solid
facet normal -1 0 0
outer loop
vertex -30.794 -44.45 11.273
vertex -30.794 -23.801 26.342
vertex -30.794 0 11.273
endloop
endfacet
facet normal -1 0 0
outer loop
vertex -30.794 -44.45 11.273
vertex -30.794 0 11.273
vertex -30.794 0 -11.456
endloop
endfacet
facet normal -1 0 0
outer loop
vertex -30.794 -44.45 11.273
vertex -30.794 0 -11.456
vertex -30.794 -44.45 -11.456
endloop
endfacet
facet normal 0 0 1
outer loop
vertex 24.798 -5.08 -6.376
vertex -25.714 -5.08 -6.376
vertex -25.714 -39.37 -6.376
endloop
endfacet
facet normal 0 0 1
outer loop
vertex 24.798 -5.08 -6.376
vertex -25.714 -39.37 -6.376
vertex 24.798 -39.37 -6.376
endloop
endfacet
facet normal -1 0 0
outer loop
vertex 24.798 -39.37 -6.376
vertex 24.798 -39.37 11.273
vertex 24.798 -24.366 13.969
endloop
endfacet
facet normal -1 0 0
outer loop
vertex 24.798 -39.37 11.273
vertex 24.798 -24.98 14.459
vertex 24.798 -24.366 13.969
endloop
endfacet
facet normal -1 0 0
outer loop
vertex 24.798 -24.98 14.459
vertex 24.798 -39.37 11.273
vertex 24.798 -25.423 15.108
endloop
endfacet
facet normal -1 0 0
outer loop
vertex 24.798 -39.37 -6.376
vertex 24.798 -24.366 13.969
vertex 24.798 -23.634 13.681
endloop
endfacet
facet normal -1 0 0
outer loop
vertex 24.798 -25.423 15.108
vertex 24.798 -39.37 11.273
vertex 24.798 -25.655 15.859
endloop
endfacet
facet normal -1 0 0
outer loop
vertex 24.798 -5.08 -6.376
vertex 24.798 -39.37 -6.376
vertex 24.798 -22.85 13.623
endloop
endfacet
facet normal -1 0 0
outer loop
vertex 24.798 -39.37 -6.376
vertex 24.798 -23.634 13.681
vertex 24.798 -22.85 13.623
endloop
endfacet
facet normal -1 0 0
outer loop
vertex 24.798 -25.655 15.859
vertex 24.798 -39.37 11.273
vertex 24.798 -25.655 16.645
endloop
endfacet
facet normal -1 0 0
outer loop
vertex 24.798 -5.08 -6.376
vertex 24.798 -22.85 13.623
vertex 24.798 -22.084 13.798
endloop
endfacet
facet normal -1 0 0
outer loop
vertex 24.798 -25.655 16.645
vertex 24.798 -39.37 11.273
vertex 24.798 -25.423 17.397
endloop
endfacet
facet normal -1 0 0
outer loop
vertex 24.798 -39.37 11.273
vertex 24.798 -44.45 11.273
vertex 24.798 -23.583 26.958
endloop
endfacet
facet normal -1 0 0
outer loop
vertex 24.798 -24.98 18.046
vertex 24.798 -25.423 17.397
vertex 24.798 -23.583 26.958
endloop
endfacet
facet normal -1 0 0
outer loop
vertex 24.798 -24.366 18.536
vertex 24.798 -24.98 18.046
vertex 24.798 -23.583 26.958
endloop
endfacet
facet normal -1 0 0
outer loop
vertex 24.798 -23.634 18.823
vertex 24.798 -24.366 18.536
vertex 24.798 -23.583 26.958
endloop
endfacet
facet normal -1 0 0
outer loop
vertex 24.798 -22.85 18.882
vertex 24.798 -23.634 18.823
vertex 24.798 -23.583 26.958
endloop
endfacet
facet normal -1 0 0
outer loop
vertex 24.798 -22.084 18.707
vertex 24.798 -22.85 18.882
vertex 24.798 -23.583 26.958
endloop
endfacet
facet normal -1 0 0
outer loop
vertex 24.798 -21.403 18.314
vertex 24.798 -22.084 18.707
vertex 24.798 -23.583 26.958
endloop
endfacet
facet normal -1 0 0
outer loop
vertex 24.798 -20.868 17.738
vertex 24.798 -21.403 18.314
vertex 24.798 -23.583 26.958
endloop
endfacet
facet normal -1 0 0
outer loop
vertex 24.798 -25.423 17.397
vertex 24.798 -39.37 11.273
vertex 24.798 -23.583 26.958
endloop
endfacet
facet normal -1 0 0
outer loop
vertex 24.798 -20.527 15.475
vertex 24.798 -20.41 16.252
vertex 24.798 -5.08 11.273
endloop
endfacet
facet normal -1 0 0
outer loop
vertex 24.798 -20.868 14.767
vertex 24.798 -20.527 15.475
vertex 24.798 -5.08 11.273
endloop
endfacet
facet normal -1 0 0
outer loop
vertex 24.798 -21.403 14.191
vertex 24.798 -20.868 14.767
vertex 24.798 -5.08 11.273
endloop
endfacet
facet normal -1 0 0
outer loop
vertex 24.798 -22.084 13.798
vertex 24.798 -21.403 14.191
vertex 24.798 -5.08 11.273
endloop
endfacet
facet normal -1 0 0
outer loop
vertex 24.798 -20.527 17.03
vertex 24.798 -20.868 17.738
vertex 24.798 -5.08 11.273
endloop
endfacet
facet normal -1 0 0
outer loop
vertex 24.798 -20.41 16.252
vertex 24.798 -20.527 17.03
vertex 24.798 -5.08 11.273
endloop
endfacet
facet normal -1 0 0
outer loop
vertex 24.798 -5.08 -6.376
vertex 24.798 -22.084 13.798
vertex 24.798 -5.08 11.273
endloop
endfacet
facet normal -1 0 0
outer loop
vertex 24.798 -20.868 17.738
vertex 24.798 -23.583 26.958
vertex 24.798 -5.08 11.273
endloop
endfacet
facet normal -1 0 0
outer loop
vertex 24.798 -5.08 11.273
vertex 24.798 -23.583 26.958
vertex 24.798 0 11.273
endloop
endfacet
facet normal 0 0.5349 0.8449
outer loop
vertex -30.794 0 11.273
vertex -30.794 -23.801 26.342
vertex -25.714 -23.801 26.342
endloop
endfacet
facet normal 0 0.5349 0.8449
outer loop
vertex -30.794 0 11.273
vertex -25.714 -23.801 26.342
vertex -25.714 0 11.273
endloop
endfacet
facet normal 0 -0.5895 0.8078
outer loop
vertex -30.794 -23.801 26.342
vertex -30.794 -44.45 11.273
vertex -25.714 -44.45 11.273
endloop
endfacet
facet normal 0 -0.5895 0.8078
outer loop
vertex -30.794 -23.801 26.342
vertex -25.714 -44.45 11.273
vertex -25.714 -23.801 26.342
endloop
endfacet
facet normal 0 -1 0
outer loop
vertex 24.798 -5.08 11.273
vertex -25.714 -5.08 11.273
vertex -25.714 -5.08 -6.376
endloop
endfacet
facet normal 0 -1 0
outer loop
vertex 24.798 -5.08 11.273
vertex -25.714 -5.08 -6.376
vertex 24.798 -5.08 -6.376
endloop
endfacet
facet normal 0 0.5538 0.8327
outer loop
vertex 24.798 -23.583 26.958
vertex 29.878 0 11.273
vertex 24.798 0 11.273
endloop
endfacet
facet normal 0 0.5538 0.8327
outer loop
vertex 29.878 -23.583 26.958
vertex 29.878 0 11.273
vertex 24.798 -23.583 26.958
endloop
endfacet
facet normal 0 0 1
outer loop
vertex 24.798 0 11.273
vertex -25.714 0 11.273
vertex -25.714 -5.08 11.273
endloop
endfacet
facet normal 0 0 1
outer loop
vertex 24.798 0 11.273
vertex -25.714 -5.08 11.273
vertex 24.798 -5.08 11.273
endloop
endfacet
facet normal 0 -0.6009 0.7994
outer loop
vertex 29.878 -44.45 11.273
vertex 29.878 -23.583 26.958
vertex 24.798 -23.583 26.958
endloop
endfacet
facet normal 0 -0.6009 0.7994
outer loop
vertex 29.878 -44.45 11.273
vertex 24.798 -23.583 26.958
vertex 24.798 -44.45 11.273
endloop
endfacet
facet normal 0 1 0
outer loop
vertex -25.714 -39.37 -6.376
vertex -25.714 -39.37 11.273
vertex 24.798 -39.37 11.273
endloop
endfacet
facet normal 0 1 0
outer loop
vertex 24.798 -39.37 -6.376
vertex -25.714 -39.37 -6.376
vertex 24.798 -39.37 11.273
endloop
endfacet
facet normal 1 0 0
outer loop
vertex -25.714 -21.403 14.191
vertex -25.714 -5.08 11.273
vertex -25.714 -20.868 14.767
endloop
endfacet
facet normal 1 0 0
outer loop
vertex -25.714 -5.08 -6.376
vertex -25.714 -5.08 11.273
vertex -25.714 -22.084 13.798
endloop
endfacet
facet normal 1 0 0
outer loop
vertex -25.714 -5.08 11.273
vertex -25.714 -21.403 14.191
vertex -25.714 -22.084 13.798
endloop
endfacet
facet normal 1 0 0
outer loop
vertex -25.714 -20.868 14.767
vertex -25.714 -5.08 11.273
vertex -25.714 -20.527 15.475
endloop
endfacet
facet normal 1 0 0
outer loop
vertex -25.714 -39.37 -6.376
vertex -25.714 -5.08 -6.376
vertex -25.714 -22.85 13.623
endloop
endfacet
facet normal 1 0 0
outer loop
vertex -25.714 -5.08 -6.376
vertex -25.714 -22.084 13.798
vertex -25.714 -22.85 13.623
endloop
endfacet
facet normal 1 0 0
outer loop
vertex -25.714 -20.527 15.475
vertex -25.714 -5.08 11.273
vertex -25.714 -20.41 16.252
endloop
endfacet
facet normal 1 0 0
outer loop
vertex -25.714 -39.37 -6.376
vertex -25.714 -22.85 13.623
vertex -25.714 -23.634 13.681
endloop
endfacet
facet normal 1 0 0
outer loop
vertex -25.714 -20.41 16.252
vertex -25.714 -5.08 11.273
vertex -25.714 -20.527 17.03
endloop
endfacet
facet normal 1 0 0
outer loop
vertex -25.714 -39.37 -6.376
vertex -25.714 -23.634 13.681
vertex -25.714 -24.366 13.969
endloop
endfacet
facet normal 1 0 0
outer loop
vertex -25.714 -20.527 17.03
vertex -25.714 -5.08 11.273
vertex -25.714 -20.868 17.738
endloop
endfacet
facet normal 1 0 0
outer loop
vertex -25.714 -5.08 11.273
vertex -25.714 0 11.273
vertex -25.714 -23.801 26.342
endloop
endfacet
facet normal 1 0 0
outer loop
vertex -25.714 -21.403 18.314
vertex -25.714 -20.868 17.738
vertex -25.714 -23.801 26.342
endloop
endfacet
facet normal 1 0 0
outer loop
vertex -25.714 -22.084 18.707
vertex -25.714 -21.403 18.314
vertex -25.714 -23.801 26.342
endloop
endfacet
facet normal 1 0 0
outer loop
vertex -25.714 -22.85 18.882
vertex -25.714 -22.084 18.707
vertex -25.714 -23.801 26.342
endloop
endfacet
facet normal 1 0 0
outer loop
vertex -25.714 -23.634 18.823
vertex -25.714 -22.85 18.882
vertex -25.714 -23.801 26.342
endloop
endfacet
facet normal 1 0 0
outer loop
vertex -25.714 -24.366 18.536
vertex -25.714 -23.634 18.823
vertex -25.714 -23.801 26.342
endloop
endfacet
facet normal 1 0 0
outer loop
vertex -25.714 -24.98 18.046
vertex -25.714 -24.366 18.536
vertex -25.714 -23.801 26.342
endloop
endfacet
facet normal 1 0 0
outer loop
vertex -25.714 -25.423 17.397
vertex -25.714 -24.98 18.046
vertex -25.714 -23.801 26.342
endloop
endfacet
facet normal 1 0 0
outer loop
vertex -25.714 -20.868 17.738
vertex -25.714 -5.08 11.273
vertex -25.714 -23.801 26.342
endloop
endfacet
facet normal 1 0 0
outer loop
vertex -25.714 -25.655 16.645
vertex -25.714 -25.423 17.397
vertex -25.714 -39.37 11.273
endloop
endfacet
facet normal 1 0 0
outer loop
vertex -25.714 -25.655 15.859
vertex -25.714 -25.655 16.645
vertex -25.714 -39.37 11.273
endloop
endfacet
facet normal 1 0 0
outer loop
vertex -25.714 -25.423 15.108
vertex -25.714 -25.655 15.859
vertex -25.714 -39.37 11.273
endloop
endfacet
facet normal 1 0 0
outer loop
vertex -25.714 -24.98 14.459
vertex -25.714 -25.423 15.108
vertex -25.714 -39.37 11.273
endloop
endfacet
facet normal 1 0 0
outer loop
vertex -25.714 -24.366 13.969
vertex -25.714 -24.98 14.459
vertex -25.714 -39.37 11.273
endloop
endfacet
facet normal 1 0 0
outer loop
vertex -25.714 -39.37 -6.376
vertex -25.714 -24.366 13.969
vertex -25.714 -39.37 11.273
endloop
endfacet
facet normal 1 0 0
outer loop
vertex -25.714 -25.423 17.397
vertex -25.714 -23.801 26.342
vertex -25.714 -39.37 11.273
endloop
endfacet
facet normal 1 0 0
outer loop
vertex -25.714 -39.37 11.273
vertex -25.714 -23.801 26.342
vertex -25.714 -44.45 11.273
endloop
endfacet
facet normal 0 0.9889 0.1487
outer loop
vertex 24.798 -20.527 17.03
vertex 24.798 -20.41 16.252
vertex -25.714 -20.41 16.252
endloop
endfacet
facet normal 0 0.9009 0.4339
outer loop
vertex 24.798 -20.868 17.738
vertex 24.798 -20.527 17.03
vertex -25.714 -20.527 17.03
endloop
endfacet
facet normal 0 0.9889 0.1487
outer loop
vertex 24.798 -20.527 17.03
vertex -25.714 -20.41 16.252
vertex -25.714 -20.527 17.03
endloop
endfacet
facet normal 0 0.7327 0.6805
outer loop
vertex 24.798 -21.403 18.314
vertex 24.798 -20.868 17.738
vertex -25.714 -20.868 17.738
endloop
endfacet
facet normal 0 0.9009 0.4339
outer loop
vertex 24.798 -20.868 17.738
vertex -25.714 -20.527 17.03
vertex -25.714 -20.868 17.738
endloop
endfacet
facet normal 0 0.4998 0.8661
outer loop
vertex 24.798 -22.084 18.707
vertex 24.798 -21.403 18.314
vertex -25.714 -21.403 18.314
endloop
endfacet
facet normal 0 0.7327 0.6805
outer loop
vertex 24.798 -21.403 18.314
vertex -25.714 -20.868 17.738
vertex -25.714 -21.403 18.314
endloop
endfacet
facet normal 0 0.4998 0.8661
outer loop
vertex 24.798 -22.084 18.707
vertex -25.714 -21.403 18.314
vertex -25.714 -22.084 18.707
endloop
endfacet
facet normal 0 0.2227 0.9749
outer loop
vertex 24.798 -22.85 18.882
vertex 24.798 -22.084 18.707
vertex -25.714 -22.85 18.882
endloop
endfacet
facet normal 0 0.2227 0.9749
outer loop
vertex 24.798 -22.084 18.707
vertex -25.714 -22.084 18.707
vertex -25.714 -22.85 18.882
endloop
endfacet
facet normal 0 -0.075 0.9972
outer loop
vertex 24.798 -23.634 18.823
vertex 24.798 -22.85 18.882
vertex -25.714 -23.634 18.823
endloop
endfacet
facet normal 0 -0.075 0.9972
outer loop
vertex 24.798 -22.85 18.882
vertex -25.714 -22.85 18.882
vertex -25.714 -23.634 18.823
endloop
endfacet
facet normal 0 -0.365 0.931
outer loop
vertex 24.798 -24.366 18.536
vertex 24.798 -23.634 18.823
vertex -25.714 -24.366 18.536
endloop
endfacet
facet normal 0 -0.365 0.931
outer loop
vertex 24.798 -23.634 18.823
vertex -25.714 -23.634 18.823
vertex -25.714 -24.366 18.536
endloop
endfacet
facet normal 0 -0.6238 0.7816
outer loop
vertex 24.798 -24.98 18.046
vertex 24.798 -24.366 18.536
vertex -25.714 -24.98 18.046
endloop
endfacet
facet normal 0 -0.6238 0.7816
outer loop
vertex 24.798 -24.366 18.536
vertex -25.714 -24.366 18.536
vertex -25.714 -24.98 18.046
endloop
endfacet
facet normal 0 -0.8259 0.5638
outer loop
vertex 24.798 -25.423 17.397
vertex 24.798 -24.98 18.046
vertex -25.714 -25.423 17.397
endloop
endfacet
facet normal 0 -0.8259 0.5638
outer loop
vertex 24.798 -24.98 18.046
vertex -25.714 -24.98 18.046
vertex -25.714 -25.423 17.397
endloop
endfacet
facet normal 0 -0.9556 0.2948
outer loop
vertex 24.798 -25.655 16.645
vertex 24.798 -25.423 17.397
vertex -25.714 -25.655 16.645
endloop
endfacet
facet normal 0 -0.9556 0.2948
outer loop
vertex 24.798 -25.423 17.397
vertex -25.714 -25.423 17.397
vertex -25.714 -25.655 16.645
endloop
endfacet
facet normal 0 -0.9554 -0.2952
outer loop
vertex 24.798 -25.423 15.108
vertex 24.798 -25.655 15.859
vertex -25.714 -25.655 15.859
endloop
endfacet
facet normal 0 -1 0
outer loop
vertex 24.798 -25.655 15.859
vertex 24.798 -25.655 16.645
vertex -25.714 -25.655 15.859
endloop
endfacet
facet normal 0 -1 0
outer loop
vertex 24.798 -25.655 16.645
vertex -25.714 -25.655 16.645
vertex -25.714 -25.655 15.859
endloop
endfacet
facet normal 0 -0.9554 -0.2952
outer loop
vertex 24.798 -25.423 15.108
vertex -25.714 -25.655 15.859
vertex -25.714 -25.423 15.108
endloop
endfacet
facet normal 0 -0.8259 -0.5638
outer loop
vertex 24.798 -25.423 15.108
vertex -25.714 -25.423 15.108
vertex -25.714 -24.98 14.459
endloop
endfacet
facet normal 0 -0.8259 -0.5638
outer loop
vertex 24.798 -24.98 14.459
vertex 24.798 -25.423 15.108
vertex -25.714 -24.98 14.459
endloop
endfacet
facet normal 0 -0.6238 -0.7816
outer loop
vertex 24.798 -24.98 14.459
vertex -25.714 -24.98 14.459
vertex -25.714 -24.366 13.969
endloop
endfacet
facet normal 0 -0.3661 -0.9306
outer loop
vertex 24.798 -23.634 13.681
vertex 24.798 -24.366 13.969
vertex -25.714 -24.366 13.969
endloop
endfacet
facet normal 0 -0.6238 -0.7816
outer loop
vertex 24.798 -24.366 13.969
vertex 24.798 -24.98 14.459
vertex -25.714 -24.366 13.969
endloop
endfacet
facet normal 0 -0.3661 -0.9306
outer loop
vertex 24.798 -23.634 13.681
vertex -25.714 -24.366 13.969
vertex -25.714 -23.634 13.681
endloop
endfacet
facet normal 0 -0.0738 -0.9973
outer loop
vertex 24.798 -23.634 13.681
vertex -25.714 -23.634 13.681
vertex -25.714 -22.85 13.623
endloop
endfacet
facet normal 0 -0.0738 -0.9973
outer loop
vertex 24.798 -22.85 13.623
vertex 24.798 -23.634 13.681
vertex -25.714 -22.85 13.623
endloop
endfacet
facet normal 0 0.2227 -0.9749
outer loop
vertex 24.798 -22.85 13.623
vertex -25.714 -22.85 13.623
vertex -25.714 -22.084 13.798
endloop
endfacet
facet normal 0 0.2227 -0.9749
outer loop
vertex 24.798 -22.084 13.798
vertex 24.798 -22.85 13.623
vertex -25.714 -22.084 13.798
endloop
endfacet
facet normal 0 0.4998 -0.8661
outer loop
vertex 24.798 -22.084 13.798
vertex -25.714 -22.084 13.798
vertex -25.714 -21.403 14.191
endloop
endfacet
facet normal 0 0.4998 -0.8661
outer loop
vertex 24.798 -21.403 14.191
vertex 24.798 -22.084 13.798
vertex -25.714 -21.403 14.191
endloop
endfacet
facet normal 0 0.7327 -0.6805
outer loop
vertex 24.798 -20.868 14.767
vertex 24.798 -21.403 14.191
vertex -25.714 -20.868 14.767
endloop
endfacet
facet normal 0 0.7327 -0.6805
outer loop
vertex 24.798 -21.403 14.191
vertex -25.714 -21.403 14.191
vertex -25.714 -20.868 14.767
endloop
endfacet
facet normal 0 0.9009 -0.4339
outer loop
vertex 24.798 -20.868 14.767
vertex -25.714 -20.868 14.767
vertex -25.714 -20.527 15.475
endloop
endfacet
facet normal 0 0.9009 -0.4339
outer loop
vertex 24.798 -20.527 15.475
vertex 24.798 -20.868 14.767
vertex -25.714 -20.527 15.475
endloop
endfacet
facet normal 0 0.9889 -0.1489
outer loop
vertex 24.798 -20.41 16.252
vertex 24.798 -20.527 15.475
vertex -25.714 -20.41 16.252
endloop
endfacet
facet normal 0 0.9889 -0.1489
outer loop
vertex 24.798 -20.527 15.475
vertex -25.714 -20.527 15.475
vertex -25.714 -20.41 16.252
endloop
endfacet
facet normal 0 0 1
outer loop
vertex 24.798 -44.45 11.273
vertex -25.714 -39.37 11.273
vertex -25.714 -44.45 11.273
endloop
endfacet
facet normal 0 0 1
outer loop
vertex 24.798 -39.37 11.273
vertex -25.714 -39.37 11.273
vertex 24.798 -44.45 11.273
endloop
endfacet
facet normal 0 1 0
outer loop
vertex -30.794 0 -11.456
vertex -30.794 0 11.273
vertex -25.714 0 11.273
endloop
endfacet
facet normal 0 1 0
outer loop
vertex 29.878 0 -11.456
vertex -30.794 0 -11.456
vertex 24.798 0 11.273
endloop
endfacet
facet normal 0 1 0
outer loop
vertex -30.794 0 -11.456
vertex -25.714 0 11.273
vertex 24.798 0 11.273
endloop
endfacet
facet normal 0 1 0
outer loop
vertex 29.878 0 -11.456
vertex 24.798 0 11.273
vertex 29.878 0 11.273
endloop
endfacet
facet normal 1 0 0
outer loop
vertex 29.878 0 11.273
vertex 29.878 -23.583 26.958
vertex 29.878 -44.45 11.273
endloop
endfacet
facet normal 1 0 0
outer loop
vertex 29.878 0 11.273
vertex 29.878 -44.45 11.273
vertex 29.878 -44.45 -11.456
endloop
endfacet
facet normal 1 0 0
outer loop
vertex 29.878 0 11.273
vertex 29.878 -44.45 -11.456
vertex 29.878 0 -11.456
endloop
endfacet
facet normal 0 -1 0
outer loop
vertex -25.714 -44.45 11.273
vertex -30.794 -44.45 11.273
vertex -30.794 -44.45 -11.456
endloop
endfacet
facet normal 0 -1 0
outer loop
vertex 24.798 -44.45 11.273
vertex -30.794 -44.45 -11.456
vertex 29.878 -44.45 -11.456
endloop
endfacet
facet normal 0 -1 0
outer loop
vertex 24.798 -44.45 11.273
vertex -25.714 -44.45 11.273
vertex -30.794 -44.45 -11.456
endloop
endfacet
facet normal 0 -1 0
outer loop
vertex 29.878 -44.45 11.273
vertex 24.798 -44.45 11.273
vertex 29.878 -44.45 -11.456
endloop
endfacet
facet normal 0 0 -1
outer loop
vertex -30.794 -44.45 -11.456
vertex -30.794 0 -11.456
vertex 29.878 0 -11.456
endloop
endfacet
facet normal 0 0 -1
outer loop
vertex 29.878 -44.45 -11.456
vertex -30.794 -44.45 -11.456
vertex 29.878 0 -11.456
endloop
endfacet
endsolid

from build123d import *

# Parameters (mm, degrees)
F0_W     = 60.6719590724
F0_H     = 22.7290727198
F1_DEPTH = 44.45
F2_T     = -5.08
F4_DEPTH = 5.08
F6_DEPTH = 5.08
F7_R     = 2.6371182677
F8_DEPTH = 55.245


with BuildPart() as f1:
    # F0 (on Front) → F1 (new body)
    with BuildSketch(Plane.XZ):
        with Locations((-0.4582479596, -0.0916495919)):
            Rectangle(F0_W, F0_H)
    extrude(amount=F1_DEPTH)

    # F2
    f2_openings = [f1.faces().sort_by_distance(p)[0] for p in [
        (-0.458248, -22.225, 11.272887),
    ]]
    offset(amount=F2_T, openings=f2_openings)

    # F3 (on face) → F4 (join)
    with BuildSketch(Plane.YZ.offset(29.8777315766)):
        Polygon((-23.583047092, 26.9575025886), (-44.45, 11.272886768), (0, 11.272886768), align=None)
    extrude(amount=-F4_DEPTH)

    # F5 (on face) → F6 (join)
    with BuildSketch(Plane(origin=(-30.7942274958, 0, 0), x_dir=(0, -1, 0), z_dir=(-1, 0, 0))):
        Polygon((23.8014105707, 26.3420511037), (0, 11.272886768), (44.45, 11.272886768), align=None)
    extrude(amount=-F6_DEPTH)

    # F7 (on face) → F8 (join)
    with BuildSketch(Plane.YZ.offset(-25.7142274958)):
        with Locations((-23.0470523238, 16.2523370236)):
            Circle(F7_R)
    extrude(amount=F8_DEPTH)


solid = f1.part
